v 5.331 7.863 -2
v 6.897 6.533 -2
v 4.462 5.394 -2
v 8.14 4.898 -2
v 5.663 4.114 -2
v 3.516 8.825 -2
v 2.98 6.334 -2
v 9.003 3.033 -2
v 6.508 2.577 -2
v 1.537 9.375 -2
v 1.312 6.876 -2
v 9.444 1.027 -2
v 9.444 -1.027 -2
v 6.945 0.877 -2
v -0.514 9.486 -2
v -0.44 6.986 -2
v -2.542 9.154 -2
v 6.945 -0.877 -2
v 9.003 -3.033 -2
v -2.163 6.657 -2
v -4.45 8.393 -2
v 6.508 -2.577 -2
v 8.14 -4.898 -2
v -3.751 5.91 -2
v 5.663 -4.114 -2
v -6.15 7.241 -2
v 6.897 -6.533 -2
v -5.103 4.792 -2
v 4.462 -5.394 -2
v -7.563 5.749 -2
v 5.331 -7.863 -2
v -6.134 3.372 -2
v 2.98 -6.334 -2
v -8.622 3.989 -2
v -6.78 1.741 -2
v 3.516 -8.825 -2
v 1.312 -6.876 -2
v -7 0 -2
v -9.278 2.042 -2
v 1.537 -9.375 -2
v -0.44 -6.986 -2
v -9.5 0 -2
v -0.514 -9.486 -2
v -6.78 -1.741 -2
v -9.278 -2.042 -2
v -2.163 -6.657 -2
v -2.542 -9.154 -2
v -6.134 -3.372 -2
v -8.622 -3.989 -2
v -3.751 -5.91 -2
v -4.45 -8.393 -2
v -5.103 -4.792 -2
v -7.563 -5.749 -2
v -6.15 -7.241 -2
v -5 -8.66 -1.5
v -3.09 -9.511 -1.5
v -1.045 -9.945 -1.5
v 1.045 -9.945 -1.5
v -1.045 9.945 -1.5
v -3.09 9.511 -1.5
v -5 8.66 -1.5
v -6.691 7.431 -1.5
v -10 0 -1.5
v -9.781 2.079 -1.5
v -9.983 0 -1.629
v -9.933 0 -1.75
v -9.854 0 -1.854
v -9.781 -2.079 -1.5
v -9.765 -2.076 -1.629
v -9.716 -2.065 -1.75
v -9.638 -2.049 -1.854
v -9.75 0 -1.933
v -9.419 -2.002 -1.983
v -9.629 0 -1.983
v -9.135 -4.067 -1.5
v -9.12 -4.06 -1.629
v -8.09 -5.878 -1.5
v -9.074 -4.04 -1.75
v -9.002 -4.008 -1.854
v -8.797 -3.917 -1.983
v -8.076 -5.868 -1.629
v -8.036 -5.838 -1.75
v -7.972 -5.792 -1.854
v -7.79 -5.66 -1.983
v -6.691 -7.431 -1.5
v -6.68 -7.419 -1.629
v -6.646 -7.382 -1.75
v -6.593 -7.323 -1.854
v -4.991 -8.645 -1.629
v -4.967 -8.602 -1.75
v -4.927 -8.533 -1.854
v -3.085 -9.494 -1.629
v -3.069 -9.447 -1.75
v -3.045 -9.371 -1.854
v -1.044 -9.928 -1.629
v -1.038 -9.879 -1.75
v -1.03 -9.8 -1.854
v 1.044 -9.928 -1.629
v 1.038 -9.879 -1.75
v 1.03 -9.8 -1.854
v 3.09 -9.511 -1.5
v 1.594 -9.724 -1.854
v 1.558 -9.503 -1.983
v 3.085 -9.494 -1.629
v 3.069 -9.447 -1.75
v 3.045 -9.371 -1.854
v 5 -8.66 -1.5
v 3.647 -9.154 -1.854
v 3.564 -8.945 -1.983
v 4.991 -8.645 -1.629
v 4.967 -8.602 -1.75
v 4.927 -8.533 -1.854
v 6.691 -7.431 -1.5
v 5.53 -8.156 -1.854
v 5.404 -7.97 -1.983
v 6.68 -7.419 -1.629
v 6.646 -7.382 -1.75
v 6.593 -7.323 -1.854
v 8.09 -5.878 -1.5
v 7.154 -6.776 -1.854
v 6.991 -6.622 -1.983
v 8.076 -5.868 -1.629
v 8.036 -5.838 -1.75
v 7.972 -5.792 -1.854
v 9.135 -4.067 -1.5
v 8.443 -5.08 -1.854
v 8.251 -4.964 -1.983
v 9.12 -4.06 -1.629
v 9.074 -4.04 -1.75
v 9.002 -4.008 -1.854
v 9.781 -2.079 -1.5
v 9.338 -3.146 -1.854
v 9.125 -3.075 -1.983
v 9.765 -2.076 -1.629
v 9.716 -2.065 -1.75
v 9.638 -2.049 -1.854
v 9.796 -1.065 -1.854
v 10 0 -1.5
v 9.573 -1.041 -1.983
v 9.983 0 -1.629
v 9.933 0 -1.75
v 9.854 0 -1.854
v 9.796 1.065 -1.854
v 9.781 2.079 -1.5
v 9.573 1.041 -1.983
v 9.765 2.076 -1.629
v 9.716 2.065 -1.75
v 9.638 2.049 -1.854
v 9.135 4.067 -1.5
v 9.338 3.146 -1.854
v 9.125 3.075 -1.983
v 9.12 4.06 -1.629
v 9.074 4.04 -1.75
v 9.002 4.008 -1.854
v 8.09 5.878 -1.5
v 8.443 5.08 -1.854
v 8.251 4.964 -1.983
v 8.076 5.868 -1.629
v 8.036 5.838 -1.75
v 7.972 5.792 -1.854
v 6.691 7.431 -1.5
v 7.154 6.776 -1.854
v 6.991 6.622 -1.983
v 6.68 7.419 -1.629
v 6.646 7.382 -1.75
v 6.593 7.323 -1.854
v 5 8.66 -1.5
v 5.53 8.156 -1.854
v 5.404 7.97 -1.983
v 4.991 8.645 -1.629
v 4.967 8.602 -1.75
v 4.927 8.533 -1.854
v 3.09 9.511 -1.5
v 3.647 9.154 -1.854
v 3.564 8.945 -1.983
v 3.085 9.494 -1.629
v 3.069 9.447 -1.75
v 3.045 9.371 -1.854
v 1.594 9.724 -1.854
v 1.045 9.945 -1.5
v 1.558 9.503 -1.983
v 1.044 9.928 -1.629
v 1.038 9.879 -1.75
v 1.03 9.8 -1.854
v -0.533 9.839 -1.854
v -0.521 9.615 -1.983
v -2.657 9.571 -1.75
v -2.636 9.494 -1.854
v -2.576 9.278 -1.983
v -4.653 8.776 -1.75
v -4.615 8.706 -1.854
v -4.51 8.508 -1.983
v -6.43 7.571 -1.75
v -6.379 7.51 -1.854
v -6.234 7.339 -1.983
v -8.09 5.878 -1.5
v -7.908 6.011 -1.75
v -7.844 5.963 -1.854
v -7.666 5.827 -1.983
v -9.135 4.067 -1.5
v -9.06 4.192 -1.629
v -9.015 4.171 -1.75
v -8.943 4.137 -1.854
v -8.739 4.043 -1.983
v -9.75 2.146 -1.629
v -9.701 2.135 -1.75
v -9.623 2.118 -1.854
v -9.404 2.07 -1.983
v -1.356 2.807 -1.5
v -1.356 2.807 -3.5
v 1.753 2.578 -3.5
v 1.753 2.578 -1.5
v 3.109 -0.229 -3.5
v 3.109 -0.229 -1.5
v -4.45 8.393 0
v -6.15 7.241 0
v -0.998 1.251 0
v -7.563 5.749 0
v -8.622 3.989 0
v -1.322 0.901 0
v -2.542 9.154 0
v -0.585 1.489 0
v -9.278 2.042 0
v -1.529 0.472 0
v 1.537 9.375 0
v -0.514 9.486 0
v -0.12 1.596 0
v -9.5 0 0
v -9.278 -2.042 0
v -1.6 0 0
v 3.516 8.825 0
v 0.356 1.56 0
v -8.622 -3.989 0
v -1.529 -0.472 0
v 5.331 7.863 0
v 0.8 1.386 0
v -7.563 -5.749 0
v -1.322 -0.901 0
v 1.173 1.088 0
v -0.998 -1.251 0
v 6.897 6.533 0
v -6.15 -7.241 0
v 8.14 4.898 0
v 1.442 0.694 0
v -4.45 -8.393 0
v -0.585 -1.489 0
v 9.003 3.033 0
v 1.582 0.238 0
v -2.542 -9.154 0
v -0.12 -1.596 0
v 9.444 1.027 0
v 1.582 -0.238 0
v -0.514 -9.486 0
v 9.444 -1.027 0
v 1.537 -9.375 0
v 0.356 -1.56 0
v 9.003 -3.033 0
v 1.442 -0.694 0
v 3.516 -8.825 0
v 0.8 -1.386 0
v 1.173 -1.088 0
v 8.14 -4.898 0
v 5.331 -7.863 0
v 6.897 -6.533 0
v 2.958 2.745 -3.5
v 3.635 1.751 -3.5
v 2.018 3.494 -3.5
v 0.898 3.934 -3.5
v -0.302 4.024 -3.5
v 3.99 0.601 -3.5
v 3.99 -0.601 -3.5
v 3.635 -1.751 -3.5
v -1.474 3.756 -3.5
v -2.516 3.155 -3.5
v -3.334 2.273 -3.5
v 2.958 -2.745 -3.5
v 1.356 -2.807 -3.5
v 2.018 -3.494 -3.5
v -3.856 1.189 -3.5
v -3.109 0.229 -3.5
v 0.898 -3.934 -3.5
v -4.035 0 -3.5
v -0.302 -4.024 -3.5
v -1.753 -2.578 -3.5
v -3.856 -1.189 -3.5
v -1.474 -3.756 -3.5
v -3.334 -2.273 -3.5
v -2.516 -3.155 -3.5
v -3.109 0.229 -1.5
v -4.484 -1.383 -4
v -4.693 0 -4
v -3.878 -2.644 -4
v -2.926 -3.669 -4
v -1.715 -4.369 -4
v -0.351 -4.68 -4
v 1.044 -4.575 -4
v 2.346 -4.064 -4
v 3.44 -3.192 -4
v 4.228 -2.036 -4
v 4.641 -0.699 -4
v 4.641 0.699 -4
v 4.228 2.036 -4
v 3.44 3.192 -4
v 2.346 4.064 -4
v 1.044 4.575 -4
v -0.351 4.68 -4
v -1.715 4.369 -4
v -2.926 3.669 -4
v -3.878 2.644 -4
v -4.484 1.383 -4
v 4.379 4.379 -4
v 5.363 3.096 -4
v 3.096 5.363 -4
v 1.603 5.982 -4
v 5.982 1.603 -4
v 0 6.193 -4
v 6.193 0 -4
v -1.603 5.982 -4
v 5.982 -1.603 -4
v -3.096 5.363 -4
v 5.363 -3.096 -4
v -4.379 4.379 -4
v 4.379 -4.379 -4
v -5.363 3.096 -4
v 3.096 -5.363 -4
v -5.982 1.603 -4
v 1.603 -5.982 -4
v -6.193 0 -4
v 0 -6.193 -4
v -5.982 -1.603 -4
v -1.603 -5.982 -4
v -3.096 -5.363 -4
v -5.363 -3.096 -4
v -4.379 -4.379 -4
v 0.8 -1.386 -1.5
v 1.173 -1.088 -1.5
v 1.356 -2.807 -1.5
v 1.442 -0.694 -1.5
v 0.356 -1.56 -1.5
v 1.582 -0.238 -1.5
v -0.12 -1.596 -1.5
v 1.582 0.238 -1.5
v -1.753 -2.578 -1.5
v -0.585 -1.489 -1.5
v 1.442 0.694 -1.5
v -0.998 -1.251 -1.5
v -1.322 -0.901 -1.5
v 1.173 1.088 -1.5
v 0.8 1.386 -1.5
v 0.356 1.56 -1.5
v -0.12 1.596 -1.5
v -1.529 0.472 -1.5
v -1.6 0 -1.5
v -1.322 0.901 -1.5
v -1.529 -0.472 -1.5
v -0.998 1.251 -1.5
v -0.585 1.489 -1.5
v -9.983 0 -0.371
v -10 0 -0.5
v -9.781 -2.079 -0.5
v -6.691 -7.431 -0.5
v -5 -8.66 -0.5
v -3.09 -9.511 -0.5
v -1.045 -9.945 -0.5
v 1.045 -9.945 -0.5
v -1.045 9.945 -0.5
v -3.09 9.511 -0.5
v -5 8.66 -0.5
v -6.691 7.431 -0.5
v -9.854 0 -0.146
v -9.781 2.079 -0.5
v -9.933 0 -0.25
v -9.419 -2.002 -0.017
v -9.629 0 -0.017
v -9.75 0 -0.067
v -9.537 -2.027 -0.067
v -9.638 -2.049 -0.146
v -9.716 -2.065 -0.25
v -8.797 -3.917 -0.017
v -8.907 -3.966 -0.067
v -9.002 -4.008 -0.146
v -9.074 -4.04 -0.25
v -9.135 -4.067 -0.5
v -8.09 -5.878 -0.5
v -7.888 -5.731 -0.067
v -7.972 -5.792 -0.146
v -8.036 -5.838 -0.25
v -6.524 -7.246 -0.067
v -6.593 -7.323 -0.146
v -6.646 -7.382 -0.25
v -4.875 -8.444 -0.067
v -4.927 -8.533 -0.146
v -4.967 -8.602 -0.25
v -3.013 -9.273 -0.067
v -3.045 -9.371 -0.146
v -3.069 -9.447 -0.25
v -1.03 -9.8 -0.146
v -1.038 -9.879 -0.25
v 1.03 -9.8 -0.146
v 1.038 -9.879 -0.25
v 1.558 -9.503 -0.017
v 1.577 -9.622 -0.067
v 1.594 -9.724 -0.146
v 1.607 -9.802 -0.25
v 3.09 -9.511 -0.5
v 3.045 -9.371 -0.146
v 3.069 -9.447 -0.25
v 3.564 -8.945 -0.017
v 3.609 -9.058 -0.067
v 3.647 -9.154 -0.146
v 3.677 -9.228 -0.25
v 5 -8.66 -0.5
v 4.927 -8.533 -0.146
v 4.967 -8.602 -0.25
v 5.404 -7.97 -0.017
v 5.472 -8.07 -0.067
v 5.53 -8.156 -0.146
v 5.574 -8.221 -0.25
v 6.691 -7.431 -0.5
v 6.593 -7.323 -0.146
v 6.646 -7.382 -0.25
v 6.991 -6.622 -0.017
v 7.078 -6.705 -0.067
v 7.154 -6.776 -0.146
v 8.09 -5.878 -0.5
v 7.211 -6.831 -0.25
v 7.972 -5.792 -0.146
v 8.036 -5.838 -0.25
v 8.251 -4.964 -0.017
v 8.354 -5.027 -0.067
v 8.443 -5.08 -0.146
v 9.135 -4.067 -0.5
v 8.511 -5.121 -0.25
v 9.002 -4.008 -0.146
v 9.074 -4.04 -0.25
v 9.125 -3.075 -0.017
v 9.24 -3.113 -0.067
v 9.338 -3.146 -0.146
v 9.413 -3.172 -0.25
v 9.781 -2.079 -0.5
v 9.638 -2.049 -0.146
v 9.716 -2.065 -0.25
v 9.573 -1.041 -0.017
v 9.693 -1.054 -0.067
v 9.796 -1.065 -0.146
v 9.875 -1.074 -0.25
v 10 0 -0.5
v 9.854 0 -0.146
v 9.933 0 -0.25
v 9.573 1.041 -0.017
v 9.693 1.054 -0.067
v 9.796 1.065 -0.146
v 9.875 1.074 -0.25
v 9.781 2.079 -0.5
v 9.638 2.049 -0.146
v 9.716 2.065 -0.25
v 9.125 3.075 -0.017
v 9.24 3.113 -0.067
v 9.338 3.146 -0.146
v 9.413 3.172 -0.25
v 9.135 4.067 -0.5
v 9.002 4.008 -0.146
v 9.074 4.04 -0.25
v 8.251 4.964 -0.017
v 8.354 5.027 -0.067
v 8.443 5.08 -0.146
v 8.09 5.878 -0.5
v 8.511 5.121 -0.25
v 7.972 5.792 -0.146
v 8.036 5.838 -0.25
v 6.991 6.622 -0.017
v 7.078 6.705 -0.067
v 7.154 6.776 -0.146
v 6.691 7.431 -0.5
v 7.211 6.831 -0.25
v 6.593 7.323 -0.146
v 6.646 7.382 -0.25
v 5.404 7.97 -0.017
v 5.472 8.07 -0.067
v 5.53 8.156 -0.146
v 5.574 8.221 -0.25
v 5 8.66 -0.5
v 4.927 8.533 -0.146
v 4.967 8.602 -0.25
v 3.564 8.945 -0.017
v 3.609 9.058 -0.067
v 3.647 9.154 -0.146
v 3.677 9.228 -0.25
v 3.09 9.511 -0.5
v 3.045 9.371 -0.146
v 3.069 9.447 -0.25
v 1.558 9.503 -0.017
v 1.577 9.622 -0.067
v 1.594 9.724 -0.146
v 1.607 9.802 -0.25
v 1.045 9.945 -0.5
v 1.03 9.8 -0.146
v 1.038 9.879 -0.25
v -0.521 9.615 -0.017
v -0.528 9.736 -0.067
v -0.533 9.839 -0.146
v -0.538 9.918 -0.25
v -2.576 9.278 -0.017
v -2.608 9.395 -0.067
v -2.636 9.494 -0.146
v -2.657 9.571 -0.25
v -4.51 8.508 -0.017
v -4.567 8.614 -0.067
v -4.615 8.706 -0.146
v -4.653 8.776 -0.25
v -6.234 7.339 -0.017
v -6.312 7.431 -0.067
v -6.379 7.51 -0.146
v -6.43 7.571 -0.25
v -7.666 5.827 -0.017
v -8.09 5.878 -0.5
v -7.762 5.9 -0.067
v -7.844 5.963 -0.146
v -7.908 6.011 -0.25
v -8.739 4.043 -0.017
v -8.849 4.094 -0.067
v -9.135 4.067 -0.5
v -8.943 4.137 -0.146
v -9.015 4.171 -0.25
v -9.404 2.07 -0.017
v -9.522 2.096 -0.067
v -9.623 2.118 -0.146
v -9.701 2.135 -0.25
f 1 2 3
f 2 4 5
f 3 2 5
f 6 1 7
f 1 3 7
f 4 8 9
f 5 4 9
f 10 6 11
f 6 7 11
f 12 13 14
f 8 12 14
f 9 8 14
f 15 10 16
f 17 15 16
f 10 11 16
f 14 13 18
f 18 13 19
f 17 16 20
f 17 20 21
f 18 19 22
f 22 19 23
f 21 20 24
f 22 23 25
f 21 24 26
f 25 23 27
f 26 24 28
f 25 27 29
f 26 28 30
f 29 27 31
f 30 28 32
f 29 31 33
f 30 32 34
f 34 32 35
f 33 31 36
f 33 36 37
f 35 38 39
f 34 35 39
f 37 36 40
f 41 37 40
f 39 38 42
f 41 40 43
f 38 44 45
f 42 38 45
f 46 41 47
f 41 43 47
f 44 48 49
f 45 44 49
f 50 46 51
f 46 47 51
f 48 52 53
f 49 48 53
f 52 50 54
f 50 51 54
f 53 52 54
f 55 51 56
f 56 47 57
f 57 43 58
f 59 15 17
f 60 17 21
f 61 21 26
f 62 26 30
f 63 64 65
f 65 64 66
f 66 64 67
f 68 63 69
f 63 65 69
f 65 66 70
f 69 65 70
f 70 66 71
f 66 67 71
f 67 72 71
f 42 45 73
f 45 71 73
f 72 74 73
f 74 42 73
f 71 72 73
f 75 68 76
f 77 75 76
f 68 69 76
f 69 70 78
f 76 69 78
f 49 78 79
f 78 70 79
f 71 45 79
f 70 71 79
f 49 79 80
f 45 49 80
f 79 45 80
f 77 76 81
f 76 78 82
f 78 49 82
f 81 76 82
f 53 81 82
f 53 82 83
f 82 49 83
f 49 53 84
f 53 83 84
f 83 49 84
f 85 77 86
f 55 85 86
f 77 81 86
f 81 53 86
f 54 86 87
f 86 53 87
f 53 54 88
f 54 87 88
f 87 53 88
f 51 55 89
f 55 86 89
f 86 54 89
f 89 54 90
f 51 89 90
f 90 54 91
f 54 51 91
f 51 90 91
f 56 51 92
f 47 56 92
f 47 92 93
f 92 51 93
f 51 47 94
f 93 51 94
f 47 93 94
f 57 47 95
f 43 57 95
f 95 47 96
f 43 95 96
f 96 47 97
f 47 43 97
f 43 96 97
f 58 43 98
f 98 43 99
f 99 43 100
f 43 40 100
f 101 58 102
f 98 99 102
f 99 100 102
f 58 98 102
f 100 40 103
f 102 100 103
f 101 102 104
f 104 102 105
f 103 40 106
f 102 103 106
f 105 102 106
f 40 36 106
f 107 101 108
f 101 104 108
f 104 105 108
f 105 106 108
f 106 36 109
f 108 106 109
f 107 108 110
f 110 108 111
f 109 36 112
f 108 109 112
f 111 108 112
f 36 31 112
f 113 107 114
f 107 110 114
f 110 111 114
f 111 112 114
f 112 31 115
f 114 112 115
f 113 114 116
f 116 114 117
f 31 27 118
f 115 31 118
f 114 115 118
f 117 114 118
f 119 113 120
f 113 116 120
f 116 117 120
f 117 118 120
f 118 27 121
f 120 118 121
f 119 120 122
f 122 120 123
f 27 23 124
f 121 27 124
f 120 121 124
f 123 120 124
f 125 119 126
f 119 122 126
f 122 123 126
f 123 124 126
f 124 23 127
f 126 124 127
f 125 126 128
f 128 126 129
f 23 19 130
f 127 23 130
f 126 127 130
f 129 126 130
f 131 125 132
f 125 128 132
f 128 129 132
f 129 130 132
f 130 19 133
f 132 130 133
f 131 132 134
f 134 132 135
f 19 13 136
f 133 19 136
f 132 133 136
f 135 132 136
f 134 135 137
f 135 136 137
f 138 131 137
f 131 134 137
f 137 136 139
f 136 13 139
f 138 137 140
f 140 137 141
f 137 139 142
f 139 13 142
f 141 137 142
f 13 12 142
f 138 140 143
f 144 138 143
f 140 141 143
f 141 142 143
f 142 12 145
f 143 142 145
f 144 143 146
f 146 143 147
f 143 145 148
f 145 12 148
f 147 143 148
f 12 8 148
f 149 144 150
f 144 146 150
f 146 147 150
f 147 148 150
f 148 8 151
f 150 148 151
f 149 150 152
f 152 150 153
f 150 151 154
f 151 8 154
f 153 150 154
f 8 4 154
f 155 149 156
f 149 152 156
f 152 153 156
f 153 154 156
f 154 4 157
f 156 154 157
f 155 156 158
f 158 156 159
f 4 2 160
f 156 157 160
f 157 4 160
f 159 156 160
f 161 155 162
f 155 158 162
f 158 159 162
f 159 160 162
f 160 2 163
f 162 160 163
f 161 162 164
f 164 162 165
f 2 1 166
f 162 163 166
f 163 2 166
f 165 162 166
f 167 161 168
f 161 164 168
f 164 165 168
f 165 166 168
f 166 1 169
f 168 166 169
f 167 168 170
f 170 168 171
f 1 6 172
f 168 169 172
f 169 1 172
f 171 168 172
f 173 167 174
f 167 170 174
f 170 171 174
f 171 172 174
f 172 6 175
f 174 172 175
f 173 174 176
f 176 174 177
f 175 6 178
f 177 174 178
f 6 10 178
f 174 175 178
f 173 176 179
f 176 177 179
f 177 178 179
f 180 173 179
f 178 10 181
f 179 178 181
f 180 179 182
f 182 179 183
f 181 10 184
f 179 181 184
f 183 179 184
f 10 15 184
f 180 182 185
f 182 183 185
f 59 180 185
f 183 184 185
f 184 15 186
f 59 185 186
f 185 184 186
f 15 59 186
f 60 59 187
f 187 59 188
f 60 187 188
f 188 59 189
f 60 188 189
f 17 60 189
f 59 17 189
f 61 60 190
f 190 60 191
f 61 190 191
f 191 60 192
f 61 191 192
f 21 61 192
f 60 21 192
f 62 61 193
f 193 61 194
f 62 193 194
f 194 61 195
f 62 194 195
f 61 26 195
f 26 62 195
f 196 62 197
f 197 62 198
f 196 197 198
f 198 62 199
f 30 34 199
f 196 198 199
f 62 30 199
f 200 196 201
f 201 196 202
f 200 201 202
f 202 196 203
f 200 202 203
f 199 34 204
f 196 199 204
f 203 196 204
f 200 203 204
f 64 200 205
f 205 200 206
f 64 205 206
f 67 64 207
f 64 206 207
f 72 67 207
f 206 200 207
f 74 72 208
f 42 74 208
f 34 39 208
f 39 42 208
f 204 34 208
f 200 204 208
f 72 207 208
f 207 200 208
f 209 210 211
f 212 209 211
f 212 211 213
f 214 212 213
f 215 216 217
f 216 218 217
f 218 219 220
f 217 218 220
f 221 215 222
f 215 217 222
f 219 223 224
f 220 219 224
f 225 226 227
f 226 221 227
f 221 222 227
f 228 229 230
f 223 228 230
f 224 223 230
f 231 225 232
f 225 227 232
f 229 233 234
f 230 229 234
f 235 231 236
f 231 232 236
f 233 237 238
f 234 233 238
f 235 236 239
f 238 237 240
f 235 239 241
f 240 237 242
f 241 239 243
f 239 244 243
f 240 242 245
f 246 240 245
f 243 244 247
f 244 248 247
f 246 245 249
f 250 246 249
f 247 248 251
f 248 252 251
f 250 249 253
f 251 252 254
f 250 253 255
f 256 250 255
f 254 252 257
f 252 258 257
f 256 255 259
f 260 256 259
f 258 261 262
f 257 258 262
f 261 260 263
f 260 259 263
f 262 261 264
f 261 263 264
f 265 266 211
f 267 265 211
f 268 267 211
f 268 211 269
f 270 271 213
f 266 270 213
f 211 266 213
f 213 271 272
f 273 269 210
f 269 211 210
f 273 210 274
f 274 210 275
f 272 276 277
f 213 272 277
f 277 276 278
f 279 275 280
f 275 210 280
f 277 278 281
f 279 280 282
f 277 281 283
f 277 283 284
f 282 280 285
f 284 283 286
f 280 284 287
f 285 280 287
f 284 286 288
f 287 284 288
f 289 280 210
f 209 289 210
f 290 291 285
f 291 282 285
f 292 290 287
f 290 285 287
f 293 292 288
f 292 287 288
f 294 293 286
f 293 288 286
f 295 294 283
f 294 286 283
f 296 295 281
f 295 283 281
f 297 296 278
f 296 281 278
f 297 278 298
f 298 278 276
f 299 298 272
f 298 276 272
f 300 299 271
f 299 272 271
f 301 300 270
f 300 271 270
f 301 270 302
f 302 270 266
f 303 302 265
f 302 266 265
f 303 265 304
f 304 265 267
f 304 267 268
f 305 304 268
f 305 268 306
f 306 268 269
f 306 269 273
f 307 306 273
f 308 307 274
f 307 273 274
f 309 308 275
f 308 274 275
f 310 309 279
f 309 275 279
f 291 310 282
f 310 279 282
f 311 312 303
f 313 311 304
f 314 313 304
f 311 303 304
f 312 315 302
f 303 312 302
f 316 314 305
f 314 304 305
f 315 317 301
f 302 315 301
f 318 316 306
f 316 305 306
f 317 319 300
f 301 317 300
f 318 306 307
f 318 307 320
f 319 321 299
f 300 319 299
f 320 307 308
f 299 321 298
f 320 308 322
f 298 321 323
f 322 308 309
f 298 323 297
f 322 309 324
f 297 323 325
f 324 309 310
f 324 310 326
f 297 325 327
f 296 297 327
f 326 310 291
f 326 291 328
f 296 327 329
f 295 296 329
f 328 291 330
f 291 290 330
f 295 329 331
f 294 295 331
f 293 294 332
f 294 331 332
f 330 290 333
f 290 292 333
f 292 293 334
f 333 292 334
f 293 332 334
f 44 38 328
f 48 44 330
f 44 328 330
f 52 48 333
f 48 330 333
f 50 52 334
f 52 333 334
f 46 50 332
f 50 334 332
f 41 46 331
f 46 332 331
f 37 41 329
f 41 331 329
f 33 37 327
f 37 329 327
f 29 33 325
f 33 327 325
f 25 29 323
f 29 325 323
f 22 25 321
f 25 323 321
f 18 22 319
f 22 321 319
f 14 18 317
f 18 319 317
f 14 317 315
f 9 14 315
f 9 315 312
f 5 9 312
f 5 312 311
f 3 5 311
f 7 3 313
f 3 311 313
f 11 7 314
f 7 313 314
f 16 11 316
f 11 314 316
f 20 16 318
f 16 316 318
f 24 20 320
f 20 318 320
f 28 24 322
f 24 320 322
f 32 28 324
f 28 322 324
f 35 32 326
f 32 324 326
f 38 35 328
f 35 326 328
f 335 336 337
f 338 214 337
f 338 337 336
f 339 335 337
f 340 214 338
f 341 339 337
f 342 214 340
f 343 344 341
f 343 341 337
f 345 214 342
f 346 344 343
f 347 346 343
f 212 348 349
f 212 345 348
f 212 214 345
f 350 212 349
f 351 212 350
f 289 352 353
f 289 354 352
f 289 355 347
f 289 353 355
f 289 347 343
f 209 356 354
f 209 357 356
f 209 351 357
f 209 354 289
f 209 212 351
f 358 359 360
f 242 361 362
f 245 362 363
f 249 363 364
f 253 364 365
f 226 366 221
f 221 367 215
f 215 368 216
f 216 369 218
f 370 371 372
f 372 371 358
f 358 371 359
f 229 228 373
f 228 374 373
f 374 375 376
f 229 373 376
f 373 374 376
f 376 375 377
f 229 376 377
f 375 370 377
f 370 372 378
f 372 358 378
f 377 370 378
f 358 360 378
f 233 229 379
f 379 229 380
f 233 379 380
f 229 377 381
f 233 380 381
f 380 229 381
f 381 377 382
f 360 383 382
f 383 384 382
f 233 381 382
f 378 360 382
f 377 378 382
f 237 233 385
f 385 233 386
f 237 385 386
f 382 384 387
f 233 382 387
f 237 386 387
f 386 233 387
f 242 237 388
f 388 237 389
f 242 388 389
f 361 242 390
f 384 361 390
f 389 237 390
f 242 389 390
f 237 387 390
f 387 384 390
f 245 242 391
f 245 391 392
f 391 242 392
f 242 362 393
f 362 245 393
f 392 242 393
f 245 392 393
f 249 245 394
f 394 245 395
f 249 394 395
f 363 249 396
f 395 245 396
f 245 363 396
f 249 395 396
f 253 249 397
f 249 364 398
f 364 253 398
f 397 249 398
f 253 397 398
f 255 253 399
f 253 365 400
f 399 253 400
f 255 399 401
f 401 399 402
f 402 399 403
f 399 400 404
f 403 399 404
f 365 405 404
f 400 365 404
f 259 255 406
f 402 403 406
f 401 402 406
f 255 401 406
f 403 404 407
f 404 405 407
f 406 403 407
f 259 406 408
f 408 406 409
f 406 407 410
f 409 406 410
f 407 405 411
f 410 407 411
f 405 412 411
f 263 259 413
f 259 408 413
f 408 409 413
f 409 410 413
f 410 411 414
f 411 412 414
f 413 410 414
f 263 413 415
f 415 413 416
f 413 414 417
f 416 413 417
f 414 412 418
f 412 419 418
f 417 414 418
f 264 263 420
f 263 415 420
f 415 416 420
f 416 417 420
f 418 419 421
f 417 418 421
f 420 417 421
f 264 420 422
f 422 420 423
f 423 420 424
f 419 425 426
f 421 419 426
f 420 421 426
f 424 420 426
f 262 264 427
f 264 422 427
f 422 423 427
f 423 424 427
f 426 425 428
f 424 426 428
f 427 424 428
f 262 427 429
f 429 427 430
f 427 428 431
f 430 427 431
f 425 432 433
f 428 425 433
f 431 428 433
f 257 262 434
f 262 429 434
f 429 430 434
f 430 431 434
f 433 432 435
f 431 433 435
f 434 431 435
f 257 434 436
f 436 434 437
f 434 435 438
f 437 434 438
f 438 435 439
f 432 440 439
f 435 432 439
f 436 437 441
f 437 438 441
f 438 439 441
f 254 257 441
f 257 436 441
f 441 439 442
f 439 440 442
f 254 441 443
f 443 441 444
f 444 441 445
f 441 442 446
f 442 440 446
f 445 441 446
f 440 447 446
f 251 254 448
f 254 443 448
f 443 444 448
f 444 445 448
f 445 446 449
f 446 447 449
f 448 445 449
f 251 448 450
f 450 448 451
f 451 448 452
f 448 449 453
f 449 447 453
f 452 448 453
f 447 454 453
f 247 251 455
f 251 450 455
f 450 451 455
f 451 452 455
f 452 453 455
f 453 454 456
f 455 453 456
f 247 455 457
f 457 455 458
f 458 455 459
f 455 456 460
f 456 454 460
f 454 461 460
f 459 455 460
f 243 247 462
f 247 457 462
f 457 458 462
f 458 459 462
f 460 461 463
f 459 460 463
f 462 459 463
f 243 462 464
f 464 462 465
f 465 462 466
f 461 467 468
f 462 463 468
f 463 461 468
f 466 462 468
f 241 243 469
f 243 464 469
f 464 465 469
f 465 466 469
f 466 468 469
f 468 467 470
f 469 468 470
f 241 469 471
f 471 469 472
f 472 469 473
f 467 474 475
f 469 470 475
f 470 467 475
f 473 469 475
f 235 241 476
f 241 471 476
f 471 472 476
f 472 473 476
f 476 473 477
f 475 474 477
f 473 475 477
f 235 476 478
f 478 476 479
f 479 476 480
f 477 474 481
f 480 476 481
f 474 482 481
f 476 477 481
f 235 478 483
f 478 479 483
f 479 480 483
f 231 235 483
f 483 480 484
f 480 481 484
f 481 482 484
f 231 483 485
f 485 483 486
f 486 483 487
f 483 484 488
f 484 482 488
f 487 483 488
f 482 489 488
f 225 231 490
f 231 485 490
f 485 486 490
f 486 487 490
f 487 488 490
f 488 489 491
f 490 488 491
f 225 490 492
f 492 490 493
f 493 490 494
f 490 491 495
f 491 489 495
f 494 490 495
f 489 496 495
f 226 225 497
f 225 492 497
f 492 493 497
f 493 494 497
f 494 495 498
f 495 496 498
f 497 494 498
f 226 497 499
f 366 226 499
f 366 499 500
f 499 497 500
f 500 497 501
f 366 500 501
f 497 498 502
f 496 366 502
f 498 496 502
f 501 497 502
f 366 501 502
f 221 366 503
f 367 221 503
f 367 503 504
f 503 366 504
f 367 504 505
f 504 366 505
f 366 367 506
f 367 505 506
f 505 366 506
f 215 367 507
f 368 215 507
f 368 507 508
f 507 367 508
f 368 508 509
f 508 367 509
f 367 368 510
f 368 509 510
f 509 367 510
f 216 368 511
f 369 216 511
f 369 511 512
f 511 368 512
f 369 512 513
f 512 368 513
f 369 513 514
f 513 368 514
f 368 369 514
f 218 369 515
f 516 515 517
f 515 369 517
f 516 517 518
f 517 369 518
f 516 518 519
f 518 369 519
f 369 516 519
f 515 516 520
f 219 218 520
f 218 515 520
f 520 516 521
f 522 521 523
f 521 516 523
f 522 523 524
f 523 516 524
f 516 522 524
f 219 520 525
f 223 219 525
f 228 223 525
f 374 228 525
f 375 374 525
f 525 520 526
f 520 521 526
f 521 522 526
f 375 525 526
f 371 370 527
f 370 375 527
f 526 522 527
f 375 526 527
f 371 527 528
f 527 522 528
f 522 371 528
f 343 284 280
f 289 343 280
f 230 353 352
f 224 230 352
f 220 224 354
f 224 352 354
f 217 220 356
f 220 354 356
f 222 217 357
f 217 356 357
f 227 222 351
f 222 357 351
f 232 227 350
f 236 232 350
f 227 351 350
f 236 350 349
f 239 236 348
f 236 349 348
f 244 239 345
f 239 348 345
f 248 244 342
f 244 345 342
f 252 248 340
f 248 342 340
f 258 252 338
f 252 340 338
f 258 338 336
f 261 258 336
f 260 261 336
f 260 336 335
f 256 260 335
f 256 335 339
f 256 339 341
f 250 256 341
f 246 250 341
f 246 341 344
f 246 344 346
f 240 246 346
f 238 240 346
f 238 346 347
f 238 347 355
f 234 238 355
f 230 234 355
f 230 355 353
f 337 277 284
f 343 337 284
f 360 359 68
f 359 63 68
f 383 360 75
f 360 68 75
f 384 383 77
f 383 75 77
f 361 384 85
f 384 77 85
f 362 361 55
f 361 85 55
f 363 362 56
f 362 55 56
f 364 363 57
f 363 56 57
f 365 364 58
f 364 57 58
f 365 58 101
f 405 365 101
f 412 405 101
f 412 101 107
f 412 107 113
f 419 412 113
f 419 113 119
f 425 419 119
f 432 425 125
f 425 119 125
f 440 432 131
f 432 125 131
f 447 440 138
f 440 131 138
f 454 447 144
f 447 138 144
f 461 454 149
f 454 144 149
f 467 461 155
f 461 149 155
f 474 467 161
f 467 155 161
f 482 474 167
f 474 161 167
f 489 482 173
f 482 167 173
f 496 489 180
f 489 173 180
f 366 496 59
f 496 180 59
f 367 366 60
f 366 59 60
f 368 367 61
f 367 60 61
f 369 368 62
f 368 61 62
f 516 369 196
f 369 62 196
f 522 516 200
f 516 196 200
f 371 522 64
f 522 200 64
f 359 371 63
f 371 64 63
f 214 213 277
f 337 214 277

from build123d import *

# Parameters (mm, degrees)
SKETCH2_R          = 1.6
CUT_EXTRUDE1_DEPTH = 15.568802353
CUT_EXTRUDE2_DEPTH = 2


with BuildPart() as part:
    # Sketch1 → Revolve1 (revolve)
    with BuildSketch(Plane(origin=(0, 0, 0), x_dir=(1, 0, 0), z_dir=(0, 1, 0)), mode=Mode.PRIVATE) as revolve1_sk:
        with BuildLine():
            Line((0, 0), (9.5, 0))
            ThreePointArc((9.5, 0), (9.853553391, 0.146446609), (10, 0.5))
            Line((10, 0.5), (10, 1.5))
            ThreePointArc((10, 1.5), (9.853553391, 1.853553391), (9.5, 2))
            Line((9.5, 2), (7, 2))
            Line((7, 2), (6.192982456, 4))
            Line((6.192982456, 4), (4.692982456, 4))
            Line((4.692982456, 4), (4.035087719, 3.5))
            Line((4.035087719, 3.5), (0, 3.5))
            Line((0, 3.5), (0, 0))
        make_face()
    revolve(revolve1_sk.sketch.rotate(Axis((0, 0, -3.5), (0, 0, 1)), 180), axis=Axis((0, 0, -3.5), (0, 0, 1)))

    # Sketch2 → Cut-Extrude1 (cut, through all)
    with BuildSketch(Plane(origin=(0, 0, -3.5), x_dir=(-1, 0, 0), z_dir=(0, 0, -1))):
        Circle(SKETCH2_R)
    extrude(amount=-CUT_EXTRUDE1_DEPTH, mode=Mode.SUBTRACT)

    # Sketch3 → Cut-Extrude2 (cut)
    with BuildSketch(Plane(origin=(0, 0, -3.5), x_dir=(-1, 0, 0), z_dir=(0, 0, -1))):
        Polygon((-1.356166015, -2.807278707), (1.753091669, -2.578113574), (3.109257683, 0.229165133), (1.356166015, 2.807278707), (-1.753091669, 2.578113574), (-3.109257683, -0.229165133), align=None)
    extrude(amount=-CUT_EXTRUDE2_DEPTH, mode=Mode.SUBTRACT)


solid = part.part
